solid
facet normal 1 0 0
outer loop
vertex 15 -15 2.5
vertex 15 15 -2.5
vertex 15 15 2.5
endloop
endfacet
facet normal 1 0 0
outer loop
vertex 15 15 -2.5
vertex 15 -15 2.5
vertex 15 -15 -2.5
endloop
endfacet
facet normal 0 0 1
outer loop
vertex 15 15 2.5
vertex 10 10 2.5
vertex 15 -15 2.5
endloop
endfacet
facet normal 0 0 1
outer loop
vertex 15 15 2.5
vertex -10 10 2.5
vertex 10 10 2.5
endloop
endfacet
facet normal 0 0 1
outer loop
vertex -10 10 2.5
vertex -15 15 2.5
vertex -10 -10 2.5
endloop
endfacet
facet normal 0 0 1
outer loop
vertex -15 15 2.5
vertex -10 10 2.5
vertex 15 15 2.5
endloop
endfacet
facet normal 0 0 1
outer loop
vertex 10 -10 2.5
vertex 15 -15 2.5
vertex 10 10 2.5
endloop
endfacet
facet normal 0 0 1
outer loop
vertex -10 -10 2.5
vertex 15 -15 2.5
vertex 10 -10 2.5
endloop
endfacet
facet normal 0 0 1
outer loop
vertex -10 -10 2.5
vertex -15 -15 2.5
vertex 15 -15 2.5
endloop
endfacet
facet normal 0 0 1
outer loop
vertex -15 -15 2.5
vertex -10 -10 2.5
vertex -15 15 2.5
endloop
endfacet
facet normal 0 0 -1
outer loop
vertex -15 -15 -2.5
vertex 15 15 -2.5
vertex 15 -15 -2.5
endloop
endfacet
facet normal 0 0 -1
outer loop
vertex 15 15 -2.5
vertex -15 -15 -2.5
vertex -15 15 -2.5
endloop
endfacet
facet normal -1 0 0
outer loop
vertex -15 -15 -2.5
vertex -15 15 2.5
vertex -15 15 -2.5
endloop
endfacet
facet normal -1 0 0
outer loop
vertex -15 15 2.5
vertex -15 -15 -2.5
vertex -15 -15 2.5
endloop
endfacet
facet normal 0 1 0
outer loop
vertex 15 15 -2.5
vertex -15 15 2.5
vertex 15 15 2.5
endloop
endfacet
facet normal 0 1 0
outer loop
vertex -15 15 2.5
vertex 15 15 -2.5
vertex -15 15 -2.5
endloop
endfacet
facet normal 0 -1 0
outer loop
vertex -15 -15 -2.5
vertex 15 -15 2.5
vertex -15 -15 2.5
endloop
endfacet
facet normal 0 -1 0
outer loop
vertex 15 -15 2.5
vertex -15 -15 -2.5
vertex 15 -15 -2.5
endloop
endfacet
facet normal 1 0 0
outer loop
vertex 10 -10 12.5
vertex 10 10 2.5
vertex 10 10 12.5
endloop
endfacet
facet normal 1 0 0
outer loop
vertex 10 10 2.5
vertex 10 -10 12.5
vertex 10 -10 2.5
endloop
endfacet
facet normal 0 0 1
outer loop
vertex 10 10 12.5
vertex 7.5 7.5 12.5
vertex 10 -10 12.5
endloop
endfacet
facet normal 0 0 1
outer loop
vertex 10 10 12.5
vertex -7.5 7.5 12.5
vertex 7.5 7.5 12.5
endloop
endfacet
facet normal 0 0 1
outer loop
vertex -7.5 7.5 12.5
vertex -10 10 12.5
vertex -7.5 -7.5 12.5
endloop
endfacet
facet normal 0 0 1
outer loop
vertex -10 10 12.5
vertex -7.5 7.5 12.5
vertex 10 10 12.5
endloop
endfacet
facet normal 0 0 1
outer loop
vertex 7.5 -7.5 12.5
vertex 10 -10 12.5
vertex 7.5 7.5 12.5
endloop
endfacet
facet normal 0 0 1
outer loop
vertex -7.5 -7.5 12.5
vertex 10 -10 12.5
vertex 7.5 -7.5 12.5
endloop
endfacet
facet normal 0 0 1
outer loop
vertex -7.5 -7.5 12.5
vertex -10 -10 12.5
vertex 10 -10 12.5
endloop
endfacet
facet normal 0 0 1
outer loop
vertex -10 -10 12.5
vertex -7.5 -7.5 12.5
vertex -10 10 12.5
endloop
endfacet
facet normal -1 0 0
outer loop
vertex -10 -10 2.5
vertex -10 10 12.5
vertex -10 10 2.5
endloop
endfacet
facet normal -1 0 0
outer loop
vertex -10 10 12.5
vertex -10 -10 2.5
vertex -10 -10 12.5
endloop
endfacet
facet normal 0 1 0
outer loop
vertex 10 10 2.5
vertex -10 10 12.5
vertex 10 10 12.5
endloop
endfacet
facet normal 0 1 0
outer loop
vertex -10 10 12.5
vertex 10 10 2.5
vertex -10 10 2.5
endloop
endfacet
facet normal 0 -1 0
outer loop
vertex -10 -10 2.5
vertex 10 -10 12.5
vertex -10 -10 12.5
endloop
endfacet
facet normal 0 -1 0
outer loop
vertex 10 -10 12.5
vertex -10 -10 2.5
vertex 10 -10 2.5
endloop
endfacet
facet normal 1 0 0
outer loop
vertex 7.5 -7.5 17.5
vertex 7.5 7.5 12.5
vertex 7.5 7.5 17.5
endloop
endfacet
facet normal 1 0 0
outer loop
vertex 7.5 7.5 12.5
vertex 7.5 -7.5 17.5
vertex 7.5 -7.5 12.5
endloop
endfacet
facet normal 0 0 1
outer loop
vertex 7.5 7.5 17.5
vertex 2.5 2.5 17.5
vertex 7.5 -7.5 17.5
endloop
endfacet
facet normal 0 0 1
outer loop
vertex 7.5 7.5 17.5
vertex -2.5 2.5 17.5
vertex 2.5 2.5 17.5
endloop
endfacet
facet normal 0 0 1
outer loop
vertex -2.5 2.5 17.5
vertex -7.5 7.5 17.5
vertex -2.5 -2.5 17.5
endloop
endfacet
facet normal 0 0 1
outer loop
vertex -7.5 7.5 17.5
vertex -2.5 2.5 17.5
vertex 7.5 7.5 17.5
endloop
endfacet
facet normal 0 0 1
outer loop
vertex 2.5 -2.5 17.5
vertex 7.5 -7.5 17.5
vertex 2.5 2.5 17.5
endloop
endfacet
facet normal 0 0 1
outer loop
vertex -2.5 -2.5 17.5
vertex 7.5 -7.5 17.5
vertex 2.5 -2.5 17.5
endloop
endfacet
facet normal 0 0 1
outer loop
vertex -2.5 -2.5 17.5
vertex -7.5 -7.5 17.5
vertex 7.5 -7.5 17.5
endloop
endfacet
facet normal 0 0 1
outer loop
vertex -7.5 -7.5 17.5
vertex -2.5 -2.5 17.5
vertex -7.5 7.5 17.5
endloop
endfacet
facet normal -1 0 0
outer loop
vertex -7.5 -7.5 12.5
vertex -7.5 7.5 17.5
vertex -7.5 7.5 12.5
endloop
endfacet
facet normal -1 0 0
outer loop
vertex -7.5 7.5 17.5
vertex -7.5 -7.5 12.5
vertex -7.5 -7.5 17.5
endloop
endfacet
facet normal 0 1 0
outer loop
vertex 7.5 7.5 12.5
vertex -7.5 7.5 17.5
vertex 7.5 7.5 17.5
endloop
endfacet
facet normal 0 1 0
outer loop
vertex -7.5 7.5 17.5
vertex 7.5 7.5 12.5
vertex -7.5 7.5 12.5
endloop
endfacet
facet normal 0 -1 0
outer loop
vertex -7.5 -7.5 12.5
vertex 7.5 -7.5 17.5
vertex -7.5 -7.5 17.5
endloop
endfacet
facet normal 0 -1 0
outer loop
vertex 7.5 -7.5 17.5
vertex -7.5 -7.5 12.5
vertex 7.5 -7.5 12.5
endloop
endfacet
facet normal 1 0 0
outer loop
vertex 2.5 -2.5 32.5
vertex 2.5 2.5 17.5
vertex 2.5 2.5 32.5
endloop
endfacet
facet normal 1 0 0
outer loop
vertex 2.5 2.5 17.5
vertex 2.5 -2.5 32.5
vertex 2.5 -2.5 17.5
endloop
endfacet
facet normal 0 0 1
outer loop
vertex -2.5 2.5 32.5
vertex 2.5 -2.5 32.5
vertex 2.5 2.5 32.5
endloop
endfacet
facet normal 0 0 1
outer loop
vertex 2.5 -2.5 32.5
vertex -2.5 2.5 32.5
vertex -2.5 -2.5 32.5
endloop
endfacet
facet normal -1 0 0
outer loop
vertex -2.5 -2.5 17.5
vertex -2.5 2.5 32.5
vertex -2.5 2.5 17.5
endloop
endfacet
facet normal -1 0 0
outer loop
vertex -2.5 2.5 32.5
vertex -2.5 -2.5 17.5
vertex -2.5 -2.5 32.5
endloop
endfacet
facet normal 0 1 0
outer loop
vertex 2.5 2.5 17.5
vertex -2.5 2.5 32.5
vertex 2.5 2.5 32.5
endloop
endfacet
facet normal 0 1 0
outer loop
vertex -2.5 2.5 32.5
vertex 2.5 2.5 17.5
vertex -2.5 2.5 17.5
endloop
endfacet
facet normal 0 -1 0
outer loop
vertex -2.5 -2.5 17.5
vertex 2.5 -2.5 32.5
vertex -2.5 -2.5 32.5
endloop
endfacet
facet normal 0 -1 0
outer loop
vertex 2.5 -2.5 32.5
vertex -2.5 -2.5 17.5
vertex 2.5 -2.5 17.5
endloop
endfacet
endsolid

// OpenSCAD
//pila de objetos
cuboBase = [30,30,5];
cuboPilar1 = [20,20,10];
cuboPilar2 =[15,15,5];
cuboPilar3 =[5,5,15];

x=0;
y=1;
z=2;


posicionPilar1 = [0,0,(cuboPilar1[z]/2)+(cuboBase[z]/2)];
posicionPilar2 = [0,0,(cuboPilar2[z]/2)+(cuboBase[z]/2)+(cuboPilar1[z])];
posicionPilar3 = [0,0,(cuboPilar3[z]/2)+(cuboBase[z]/2)+(cuboPilar1[z])+(cuboPilar2[z])];



cube(cuboBase,center=true);



translate(posicionPilar1)
cube(cuboPilar1,center=true);

translate(posicionPilar2)
cube(cuboPilar2,center=true);

translate(posicionPilar3)
cube(cuboPilar3,center=true);
